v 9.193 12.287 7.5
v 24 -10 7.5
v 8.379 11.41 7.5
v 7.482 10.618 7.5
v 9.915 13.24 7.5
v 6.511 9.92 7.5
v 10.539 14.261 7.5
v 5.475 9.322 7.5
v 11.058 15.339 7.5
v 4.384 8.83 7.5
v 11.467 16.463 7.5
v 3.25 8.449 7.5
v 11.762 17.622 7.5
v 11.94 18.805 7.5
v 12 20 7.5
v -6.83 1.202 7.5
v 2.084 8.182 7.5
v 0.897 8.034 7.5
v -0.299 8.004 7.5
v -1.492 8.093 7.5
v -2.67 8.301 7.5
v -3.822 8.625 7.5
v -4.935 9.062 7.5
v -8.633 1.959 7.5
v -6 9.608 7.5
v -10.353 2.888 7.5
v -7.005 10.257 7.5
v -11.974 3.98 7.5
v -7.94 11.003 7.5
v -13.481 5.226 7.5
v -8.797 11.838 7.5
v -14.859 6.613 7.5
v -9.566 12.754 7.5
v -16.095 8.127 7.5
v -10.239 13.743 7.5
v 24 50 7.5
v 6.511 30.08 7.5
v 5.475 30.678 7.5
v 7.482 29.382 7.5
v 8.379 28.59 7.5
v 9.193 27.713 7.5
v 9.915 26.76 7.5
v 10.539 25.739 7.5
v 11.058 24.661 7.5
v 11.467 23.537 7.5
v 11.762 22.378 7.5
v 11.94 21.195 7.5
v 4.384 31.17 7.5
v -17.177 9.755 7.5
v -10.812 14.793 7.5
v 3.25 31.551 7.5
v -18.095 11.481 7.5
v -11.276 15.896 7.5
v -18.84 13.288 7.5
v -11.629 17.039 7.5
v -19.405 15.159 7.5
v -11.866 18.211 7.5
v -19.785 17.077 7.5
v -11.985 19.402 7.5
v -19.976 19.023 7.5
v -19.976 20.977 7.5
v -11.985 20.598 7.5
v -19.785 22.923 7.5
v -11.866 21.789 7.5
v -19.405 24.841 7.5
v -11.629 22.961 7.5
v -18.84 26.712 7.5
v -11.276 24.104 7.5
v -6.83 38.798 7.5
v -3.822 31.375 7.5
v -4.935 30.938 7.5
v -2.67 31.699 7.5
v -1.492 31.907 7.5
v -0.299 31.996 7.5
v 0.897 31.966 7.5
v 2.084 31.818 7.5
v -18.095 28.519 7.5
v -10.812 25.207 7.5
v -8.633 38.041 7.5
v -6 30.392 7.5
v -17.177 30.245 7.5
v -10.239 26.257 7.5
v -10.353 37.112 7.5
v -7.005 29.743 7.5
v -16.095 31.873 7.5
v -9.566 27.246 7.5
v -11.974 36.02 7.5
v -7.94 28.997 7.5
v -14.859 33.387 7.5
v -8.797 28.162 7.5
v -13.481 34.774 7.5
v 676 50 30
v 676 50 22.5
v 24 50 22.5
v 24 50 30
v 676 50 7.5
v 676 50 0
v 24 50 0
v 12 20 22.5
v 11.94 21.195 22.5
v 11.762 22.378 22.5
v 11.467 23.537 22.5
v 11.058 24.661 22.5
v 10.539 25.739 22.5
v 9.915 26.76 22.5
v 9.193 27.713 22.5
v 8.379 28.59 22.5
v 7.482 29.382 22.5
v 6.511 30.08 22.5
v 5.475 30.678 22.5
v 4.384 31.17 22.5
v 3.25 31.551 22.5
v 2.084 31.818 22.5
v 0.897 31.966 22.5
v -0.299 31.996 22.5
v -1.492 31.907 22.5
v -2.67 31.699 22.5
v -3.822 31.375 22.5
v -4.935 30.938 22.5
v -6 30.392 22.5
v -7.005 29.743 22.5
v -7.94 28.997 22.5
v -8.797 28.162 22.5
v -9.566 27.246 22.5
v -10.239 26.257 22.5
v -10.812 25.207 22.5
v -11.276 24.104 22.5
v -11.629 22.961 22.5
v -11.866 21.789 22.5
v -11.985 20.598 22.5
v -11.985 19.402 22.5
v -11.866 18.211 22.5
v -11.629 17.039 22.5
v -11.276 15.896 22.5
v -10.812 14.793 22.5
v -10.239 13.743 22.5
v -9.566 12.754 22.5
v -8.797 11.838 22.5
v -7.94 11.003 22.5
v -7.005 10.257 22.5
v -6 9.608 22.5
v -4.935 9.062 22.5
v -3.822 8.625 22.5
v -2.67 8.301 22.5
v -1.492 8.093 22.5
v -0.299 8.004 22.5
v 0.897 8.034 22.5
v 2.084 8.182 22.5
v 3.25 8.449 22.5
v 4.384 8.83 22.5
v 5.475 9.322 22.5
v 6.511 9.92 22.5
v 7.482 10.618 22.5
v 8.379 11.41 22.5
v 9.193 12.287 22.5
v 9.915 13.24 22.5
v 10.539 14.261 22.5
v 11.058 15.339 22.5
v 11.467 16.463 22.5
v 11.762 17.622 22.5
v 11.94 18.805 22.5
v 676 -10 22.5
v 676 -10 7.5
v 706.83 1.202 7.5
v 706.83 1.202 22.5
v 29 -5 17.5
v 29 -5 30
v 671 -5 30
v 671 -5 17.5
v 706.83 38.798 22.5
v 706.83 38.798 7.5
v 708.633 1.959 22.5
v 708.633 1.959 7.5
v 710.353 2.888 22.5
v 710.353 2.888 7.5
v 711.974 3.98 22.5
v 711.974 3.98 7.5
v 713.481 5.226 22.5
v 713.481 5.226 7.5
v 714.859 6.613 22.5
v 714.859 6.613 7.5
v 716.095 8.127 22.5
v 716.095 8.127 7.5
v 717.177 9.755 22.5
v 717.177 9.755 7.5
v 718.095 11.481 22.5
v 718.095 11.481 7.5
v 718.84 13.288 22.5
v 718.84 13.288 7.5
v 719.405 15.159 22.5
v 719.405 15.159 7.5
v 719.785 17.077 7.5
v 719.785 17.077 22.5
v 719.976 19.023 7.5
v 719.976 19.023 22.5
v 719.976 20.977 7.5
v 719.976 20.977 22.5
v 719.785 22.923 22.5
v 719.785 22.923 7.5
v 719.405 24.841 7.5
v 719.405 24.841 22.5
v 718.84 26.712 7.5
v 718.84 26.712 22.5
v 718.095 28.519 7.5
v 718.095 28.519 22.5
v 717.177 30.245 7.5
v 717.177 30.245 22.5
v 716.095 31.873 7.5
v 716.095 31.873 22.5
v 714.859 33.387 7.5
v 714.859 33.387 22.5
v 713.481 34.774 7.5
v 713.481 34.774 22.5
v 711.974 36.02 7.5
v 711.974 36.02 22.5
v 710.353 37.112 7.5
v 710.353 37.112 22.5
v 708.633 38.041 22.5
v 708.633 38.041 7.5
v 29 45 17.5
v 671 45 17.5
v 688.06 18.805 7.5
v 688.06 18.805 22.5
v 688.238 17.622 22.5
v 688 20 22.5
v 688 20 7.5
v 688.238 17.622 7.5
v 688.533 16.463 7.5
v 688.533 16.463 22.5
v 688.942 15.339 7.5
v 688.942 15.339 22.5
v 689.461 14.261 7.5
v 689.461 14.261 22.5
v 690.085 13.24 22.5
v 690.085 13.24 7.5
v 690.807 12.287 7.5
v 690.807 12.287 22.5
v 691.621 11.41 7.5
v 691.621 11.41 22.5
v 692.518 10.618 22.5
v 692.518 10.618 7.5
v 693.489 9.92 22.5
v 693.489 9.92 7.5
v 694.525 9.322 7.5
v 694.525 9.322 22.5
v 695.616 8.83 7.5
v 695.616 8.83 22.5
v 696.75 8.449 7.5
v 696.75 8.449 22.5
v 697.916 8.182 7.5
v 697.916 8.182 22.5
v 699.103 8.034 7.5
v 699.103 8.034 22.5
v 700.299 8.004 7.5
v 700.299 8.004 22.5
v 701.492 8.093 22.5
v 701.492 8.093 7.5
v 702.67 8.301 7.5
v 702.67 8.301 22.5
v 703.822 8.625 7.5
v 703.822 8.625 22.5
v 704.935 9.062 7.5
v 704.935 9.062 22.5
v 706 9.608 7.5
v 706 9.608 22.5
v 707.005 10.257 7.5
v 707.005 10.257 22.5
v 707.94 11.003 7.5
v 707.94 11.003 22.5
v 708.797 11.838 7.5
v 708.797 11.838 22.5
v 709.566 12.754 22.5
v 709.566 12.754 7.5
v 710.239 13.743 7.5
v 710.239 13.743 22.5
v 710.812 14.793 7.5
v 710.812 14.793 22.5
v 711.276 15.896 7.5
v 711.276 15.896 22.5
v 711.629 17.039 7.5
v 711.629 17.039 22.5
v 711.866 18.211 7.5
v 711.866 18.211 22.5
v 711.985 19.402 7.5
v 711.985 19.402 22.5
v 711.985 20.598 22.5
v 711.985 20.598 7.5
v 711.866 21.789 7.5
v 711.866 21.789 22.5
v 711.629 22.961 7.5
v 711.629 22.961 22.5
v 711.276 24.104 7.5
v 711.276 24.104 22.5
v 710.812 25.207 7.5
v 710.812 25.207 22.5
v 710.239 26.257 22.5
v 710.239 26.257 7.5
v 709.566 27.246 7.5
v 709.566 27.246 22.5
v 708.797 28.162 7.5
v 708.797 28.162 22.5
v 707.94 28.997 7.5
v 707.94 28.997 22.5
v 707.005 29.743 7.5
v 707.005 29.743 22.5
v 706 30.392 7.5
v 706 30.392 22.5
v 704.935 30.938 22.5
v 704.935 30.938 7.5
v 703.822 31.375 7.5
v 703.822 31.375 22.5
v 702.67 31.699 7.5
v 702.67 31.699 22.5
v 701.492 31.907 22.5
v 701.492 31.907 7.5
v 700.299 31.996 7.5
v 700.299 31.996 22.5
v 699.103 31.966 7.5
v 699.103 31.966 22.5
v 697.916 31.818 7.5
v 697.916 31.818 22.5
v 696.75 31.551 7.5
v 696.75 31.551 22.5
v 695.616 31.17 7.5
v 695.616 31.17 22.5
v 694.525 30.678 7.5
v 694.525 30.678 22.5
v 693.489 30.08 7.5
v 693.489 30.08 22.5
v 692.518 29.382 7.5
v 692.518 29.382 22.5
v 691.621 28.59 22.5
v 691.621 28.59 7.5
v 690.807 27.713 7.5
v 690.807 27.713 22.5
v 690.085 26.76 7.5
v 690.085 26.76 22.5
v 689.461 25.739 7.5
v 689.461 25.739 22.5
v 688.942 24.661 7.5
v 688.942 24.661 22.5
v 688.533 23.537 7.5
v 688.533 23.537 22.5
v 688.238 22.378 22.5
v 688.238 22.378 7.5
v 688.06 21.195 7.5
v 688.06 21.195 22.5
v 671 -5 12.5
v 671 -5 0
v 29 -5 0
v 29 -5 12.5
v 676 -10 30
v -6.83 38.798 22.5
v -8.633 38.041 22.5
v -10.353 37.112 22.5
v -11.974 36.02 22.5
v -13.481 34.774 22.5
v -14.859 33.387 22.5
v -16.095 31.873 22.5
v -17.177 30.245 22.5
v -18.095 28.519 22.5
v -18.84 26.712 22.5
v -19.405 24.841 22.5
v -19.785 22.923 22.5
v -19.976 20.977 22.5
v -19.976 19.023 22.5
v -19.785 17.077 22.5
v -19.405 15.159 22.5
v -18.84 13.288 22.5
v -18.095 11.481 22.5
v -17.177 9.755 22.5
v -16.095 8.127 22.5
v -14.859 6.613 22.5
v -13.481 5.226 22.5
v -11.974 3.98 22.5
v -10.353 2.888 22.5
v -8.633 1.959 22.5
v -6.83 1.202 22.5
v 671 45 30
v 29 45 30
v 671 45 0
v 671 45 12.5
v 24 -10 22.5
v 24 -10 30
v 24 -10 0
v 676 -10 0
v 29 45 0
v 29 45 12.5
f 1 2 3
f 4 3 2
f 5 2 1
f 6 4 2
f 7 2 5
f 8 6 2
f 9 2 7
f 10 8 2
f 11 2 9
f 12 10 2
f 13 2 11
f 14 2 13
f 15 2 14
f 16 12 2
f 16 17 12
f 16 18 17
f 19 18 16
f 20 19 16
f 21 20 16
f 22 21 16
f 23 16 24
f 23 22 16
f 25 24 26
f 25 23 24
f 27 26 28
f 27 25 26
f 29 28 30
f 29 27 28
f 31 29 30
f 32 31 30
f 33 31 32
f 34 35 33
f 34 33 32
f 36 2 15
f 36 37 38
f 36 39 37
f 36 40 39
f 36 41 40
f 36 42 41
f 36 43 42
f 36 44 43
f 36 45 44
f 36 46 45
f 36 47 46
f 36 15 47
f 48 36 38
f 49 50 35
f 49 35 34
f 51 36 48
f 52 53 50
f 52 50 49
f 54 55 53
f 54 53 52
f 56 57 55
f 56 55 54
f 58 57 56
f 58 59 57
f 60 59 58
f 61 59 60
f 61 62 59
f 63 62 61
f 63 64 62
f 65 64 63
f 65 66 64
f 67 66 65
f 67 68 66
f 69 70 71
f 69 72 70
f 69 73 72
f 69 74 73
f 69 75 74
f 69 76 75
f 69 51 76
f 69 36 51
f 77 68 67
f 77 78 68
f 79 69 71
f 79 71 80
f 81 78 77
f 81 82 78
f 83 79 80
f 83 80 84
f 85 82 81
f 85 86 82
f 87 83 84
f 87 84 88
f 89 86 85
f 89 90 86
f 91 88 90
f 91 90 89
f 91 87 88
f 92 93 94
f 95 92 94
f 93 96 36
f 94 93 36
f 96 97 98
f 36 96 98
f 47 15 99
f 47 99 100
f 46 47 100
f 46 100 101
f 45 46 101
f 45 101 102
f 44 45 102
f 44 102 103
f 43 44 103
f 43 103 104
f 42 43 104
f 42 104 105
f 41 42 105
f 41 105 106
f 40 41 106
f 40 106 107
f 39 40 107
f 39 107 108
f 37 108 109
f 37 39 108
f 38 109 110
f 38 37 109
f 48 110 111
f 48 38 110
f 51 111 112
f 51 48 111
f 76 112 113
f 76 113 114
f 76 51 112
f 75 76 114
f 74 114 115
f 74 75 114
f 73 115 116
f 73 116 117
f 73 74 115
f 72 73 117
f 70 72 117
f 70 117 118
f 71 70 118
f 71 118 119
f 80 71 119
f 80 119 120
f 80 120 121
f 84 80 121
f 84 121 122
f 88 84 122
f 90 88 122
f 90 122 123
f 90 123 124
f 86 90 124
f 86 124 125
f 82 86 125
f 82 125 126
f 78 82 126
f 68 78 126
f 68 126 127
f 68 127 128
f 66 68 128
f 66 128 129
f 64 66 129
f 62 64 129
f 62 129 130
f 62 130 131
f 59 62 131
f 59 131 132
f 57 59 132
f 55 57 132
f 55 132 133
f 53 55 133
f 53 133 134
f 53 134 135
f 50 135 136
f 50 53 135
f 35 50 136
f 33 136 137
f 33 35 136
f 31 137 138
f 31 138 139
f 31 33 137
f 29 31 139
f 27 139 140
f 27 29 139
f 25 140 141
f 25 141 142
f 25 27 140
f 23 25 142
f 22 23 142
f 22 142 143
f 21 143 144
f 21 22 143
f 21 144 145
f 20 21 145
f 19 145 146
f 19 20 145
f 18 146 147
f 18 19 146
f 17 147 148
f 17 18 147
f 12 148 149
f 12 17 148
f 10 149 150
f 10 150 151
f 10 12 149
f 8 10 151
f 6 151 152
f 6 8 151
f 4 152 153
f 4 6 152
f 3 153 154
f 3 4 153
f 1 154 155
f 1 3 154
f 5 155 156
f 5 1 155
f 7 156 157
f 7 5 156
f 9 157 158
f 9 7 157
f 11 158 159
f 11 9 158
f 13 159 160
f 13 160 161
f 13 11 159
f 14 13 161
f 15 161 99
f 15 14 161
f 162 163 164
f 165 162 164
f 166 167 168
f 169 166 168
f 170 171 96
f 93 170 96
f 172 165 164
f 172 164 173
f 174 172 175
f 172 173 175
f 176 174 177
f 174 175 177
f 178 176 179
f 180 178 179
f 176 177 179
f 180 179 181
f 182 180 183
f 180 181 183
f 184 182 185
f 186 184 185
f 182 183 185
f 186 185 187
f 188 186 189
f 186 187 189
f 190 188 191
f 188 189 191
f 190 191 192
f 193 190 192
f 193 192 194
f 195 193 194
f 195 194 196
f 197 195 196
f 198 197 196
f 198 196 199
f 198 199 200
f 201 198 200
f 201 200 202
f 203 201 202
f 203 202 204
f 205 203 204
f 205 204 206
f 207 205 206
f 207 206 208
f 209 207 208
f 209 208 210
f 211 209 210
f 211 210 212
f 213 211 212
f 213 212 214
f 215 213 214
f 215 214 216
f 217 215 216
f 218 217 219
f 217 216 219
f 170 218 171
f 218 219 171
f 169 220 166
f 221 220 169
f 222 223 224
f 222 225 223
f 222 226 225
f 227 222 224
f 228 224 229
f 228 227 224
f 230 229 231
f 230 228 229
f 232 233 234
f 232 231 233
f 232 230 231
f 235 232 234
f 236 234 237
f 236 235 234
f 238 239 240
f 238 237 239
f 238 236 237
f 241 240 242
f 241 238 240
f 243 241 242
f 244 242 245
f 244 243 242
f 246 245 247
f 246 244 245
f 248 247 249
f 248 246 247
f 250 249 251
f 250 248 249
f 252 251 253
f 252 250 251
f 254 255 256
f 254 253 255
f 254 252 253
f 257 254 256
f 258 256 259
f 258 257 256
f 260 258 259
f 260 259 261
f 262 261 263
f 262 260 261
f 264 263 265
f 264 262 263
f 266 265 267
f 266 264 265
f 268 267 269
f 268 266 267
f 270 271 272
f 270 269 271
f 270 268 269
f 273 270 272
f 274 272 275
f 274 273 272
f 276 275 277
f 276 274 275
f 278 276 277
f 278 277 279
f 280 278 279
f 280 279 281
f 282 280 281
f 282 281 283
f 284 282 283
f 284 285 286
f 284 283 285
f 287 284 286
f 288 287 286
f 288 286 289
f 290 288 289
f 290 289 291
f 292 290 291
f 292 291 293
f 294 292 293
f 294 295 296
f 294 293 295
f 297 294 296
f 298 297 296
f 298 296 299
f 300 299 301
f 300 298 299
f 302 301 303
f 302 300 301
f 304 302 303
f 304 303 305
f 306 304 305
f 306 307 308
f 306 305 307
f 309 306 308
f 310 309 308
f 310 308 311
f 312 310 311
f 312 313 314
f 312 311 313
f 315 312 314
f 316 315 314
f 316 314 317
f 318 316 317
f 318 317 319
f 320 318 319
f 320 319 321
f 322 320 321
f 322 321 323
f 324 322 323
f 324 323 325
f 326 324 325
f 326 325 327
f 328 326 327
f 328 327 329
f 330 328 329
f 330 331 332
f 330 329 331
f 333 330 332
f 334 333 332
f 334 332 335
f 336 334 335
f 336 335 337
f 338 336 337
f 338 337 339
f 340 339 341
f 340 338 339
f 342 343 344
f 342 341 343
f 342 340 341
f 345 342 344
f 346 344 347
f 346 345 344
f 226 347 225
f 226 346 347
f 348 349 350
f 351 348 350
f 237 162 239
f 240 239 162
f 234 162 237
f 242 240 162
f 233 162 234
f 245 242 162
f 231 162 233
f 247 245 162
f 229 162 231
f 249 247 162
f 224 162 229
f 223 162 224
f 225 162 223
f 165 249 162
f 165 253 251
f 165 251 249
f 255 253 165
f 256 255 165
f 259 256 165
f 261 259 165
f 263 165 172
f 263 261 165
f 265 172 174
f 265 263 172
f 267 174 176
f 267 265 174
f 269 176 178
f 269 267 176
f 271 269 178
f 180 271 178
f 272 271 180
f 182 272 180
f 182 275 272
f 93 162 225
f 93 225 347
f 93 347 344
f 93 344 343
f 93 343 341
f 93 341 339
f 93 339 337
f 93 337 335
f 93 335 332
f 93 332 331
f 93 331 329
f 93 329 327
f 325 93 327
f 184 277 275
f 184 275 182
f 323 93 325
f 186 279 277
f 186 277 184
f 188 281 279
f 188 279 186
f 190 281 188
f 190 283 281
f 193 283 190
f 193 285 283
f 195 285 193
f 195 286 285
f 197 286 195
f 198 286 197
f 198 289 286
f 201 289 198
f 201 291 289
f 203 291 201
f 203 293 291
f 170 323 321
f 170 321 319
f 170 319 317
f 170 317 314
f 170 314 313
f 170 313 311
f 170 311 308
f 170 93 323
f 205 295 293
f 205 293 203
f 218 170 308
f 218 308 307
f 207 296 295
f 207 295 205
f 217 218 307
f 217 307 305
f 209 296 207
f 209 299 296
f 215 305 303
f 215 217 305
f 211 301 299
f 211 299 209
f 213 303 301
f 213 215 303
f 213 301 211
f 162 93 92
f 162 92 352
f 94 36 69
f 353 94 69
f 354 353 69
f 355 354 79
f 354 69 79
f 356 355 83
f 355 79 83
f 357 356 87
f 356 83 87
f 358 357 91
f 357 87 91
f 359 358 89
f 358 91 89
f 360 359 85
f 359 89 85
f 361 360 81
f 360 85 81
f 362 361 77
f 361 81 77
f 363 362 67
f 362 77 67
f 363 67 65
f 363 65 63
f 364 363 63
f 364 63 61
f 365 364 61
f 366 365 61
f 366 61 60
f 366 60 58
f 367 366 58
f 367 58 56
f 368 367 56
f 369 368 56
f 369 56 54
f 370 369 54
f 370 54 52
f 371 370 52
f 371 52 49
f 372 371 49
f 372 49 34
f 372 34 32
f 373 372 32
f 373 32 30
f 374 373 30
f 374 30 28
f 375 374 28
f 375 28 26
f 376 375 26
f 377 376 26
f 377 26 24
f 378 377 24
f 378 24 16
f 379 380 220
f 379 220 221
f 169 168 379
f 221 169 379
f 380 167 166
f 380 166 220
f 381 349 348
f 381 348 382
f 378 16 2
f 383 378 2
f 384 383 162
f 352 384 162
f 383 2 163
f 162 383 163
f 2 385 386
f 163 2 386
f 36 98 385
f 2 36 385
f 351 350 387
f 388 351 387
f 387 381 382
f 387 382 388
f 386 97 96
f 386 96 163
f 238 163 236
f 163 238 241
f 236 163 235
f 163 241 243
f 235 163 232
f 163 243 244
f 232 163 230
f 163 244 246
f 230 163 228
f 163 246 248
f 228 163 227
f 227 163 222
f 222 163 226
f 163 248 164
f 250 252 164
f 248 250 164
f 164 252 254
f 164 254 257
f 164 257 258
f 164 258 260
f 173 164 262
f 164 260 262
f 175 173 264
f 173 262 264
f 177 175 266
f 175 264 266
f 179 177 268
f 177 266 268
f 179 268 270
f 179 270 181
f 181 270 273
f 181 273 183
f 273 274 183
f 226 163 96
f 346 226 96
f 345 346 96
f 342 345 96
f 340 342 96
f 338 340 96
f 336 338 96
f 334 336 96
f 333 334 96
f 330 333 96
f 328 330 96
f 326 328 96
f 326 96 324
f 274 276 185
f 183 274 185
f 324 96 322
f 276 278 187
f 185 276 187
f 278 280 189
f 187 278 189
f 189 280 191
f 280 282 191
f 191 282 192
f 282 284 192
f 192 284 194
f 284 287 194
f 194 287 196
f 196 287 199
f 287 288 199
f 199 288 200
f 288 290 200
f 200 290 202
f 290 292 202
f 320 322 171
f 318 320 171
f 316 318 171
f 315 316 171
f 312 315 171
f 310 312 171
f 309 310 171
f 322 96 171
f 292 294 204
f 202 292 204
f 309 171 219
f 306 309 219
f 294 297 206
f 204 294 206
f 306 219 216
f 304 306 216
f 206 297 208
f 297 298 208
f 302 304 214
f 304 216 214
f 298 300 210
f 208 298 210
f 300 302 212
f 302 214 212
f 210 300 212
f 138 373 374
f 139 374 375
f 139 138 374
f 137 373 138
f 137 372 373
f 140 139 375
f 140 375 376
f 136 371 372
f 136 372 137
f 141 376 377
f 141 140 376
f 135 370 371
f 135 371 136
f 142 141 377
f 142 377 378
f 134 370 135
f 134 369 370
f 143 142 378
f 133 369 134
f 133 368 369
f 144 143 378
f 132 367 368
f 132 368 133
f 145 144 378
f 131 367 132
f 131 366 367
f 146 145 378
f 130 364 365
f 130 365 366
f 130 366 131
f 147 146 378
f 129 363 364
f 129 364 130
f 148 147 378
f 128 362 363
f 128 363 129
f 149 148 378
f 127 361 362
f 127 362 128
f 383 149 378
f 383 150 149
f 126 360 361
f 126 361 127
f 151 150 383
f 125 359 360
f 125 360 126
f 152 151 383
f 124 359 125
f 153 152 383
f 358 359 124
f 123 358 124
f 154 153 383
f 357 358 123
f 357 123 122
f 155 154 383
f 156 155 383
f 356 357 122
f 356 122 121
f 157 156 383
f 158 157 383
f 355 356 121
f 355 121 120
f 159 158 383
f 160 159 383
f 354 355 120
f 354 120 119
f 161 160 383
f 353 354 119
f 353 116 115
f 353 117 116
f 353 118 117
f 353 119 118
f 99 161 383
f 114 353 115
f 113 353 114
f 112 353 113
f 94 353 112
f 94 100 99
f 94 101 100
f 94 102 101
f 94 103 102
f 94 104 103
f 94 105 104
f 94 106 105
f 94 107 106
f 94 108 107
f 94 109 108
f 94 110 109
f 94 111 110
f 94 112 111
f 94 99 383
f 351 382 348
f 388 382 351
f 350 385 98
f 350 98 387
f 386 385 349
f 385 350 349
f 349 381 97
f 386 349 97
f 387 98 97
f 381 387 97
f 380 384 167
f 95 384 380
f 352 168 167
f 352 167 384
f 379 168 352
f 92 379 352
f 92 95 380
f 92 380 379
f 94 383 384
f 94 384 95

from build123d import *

# Parameters (mm, degrees)
SKETCH_1_R          = 12
EXTRUDE_1_DEPTH     = 30
CUT_EXTRUDE_START   = -7.5
SKETCH_2_R          = 12
CUT_EXTRUDE_1_DEPTH = 7.5
CUT_EXTRUDE_2_DEPTH = 7.5
SKETCH_4_W          = 642
SKETCH_4_H          = 50
CUT_EXTRUDE_3_DEPTH = 12.5
SKETCH_5_W          = 642
SKETCH_5_H          = 50
CUT_EXTRUDE_4_DEPTH = 12.5


with BuildPart() as part:
    # 草图1 → 凸台-拉伸1 (new body)
    with BuildSketch(Plane.XY):
        with BuildLine():
            Line((675.999999195, -9.999997784), (706.830258378, 1.202458393))
            ThreePointArc((706.830258378, 1.202458393), (720, 20), (706.830258378, 38.797541607))
            Line((706.830258378, 38.797541607), (675.999999195, 49.999997784))
            Line((675.999999195, 49.999997784), (24.000000805, 49.999997784))
            Line((24.000000805, 49.999997784), (-6.830258378, 38.797541607))
            ThreePointArc((-6.830258378, 38.797541607), (-20, 20), (-6.830258378, 1.202458393))
            Line((-6.830258378, 1.202458393), (24.000000805, -9.999997784))
            Line((24.000000805, -9.999997784), (675.999999195, -9.999997784))
        make_face()
        with Locations((0, 20)):
            Circle(SKETCH_1_R, mode=Mode.SUBTRACT)
        with Locations(Location((700, 20, 0), (0, 0, 180))):
            Circle(SKETCH_1_R, mode=Mode.SUBTRACT)
    extrude(amount=EXTRUDE_1_DEPTH)

    # 草图2 → 切除-拉伸1 (cut)
    # profile 1 of 2: a face of its own
    with BuildSketch(Plane.XY.offset(30).offset(CUT_EXTRUDE_START)):
        with BuildLine():
            Line((24.000000805, 49.999997784), (-6.830258378, 38.797541607))
            ThreePointArc((-6.830258378, 38.797541607), (-20, 20), (-6.830258378, 1.202458393))
            Line((-6.830258378, 1.202458393), (24.000000805, -9.999997784))
            Line((24.000000805, -9.999997784), (24.000000805, 49.999997784))
        make_face()
        with Locations((0, 20)):
            Circle(SKETCH_2_R, mode=Mode.SUBTRACT)
    # profile 2 of 2: a face of its own
    with BuildSketch(Plane.XY.offset(30).offset(CUT_EXTRUDE_START)):
        with BuildLine():
            Line((706.830258378, 38.797541607), (675.999999195, 49.999997784))
            Line((675.999999195, 49.999997784), (675.999999195, -9.999997784))
            Line((675.999999195, -9.999997784), (706.830258378, 1.202458393))
            ThreePointArc((706.830258378, 1.202458393), (720, 20), (706.830258378, 38.797541607))
        make_face()
    extrude(amount=CUT_EXTRUDE_1_DEPTH, mode=Mode.SUBTRACT)

    # 草图3 → 切除-拉伸2 (cut)
    with BuildSketch(Plane(origin=(0, 0, 0), x_dir=(-1, 0, 0), z_dir=(0, 0, -1))):
        with BuildLine():
            Line((6.830258378, 38.797541607), (-24.000000805, 49.999997784))
            Line((-24.000000805, 49.999997784), (-24.000000805, -9.999997784))
            Line((-24.000000805, -9.999997784), (6.830258378, 1.202458393))
            ThreePointArc((6.830258378, 1.202458393), (20, 20), (6.830258378, 38.797541607))
        make_face()
        with BuildLine():
            Line((-706.830258378, 38.797541607), (-675.999999195, 49.999997784))
            Line((-675.999999195, 49.999997784), (-675.999999195, -9.999997784))
            Line((-675.999999195, -9.999997784), (-706.830258378, 1.202458393))
            ThreePointArc((-706.830258378, 1.202458393), (-720, 20), (-706.830258378, 38.797541607))
        make_face()
    extrude(amount=-CUT_EXTRUDE_2_DEPTH, mode=Mode.SUBTRACT)

    # 草图4 → 切除-拉伸3 (cut)
    with BuildSketch(Plane(origin=(0, 0, 0), x_dir=(-1, 0, 0), z_dir=(0, 0, -1))):
        with Locations((-349.999999195, 20.000002216)):
            Rectangle(SKETCH_4_W, SKETCH_4_H)
    extrude(amount=-CUT_EXTRUDE_3_DEPTH, mode=Mode.SUBTRACT)

    # 草图5 → 切除-拉伸4 (cut)
    with BuildSketch(Plane.XY.offset(30)):
        with Locations((350.000000805, 19.999997784)):
            Rectangle(SKETCH_5_W, SKETCH_5_H)
    extrude(amount=-CUT_EXTRUDE_4_DEPTH, mode=Mode.SUBTRACT)


solid = part.part
